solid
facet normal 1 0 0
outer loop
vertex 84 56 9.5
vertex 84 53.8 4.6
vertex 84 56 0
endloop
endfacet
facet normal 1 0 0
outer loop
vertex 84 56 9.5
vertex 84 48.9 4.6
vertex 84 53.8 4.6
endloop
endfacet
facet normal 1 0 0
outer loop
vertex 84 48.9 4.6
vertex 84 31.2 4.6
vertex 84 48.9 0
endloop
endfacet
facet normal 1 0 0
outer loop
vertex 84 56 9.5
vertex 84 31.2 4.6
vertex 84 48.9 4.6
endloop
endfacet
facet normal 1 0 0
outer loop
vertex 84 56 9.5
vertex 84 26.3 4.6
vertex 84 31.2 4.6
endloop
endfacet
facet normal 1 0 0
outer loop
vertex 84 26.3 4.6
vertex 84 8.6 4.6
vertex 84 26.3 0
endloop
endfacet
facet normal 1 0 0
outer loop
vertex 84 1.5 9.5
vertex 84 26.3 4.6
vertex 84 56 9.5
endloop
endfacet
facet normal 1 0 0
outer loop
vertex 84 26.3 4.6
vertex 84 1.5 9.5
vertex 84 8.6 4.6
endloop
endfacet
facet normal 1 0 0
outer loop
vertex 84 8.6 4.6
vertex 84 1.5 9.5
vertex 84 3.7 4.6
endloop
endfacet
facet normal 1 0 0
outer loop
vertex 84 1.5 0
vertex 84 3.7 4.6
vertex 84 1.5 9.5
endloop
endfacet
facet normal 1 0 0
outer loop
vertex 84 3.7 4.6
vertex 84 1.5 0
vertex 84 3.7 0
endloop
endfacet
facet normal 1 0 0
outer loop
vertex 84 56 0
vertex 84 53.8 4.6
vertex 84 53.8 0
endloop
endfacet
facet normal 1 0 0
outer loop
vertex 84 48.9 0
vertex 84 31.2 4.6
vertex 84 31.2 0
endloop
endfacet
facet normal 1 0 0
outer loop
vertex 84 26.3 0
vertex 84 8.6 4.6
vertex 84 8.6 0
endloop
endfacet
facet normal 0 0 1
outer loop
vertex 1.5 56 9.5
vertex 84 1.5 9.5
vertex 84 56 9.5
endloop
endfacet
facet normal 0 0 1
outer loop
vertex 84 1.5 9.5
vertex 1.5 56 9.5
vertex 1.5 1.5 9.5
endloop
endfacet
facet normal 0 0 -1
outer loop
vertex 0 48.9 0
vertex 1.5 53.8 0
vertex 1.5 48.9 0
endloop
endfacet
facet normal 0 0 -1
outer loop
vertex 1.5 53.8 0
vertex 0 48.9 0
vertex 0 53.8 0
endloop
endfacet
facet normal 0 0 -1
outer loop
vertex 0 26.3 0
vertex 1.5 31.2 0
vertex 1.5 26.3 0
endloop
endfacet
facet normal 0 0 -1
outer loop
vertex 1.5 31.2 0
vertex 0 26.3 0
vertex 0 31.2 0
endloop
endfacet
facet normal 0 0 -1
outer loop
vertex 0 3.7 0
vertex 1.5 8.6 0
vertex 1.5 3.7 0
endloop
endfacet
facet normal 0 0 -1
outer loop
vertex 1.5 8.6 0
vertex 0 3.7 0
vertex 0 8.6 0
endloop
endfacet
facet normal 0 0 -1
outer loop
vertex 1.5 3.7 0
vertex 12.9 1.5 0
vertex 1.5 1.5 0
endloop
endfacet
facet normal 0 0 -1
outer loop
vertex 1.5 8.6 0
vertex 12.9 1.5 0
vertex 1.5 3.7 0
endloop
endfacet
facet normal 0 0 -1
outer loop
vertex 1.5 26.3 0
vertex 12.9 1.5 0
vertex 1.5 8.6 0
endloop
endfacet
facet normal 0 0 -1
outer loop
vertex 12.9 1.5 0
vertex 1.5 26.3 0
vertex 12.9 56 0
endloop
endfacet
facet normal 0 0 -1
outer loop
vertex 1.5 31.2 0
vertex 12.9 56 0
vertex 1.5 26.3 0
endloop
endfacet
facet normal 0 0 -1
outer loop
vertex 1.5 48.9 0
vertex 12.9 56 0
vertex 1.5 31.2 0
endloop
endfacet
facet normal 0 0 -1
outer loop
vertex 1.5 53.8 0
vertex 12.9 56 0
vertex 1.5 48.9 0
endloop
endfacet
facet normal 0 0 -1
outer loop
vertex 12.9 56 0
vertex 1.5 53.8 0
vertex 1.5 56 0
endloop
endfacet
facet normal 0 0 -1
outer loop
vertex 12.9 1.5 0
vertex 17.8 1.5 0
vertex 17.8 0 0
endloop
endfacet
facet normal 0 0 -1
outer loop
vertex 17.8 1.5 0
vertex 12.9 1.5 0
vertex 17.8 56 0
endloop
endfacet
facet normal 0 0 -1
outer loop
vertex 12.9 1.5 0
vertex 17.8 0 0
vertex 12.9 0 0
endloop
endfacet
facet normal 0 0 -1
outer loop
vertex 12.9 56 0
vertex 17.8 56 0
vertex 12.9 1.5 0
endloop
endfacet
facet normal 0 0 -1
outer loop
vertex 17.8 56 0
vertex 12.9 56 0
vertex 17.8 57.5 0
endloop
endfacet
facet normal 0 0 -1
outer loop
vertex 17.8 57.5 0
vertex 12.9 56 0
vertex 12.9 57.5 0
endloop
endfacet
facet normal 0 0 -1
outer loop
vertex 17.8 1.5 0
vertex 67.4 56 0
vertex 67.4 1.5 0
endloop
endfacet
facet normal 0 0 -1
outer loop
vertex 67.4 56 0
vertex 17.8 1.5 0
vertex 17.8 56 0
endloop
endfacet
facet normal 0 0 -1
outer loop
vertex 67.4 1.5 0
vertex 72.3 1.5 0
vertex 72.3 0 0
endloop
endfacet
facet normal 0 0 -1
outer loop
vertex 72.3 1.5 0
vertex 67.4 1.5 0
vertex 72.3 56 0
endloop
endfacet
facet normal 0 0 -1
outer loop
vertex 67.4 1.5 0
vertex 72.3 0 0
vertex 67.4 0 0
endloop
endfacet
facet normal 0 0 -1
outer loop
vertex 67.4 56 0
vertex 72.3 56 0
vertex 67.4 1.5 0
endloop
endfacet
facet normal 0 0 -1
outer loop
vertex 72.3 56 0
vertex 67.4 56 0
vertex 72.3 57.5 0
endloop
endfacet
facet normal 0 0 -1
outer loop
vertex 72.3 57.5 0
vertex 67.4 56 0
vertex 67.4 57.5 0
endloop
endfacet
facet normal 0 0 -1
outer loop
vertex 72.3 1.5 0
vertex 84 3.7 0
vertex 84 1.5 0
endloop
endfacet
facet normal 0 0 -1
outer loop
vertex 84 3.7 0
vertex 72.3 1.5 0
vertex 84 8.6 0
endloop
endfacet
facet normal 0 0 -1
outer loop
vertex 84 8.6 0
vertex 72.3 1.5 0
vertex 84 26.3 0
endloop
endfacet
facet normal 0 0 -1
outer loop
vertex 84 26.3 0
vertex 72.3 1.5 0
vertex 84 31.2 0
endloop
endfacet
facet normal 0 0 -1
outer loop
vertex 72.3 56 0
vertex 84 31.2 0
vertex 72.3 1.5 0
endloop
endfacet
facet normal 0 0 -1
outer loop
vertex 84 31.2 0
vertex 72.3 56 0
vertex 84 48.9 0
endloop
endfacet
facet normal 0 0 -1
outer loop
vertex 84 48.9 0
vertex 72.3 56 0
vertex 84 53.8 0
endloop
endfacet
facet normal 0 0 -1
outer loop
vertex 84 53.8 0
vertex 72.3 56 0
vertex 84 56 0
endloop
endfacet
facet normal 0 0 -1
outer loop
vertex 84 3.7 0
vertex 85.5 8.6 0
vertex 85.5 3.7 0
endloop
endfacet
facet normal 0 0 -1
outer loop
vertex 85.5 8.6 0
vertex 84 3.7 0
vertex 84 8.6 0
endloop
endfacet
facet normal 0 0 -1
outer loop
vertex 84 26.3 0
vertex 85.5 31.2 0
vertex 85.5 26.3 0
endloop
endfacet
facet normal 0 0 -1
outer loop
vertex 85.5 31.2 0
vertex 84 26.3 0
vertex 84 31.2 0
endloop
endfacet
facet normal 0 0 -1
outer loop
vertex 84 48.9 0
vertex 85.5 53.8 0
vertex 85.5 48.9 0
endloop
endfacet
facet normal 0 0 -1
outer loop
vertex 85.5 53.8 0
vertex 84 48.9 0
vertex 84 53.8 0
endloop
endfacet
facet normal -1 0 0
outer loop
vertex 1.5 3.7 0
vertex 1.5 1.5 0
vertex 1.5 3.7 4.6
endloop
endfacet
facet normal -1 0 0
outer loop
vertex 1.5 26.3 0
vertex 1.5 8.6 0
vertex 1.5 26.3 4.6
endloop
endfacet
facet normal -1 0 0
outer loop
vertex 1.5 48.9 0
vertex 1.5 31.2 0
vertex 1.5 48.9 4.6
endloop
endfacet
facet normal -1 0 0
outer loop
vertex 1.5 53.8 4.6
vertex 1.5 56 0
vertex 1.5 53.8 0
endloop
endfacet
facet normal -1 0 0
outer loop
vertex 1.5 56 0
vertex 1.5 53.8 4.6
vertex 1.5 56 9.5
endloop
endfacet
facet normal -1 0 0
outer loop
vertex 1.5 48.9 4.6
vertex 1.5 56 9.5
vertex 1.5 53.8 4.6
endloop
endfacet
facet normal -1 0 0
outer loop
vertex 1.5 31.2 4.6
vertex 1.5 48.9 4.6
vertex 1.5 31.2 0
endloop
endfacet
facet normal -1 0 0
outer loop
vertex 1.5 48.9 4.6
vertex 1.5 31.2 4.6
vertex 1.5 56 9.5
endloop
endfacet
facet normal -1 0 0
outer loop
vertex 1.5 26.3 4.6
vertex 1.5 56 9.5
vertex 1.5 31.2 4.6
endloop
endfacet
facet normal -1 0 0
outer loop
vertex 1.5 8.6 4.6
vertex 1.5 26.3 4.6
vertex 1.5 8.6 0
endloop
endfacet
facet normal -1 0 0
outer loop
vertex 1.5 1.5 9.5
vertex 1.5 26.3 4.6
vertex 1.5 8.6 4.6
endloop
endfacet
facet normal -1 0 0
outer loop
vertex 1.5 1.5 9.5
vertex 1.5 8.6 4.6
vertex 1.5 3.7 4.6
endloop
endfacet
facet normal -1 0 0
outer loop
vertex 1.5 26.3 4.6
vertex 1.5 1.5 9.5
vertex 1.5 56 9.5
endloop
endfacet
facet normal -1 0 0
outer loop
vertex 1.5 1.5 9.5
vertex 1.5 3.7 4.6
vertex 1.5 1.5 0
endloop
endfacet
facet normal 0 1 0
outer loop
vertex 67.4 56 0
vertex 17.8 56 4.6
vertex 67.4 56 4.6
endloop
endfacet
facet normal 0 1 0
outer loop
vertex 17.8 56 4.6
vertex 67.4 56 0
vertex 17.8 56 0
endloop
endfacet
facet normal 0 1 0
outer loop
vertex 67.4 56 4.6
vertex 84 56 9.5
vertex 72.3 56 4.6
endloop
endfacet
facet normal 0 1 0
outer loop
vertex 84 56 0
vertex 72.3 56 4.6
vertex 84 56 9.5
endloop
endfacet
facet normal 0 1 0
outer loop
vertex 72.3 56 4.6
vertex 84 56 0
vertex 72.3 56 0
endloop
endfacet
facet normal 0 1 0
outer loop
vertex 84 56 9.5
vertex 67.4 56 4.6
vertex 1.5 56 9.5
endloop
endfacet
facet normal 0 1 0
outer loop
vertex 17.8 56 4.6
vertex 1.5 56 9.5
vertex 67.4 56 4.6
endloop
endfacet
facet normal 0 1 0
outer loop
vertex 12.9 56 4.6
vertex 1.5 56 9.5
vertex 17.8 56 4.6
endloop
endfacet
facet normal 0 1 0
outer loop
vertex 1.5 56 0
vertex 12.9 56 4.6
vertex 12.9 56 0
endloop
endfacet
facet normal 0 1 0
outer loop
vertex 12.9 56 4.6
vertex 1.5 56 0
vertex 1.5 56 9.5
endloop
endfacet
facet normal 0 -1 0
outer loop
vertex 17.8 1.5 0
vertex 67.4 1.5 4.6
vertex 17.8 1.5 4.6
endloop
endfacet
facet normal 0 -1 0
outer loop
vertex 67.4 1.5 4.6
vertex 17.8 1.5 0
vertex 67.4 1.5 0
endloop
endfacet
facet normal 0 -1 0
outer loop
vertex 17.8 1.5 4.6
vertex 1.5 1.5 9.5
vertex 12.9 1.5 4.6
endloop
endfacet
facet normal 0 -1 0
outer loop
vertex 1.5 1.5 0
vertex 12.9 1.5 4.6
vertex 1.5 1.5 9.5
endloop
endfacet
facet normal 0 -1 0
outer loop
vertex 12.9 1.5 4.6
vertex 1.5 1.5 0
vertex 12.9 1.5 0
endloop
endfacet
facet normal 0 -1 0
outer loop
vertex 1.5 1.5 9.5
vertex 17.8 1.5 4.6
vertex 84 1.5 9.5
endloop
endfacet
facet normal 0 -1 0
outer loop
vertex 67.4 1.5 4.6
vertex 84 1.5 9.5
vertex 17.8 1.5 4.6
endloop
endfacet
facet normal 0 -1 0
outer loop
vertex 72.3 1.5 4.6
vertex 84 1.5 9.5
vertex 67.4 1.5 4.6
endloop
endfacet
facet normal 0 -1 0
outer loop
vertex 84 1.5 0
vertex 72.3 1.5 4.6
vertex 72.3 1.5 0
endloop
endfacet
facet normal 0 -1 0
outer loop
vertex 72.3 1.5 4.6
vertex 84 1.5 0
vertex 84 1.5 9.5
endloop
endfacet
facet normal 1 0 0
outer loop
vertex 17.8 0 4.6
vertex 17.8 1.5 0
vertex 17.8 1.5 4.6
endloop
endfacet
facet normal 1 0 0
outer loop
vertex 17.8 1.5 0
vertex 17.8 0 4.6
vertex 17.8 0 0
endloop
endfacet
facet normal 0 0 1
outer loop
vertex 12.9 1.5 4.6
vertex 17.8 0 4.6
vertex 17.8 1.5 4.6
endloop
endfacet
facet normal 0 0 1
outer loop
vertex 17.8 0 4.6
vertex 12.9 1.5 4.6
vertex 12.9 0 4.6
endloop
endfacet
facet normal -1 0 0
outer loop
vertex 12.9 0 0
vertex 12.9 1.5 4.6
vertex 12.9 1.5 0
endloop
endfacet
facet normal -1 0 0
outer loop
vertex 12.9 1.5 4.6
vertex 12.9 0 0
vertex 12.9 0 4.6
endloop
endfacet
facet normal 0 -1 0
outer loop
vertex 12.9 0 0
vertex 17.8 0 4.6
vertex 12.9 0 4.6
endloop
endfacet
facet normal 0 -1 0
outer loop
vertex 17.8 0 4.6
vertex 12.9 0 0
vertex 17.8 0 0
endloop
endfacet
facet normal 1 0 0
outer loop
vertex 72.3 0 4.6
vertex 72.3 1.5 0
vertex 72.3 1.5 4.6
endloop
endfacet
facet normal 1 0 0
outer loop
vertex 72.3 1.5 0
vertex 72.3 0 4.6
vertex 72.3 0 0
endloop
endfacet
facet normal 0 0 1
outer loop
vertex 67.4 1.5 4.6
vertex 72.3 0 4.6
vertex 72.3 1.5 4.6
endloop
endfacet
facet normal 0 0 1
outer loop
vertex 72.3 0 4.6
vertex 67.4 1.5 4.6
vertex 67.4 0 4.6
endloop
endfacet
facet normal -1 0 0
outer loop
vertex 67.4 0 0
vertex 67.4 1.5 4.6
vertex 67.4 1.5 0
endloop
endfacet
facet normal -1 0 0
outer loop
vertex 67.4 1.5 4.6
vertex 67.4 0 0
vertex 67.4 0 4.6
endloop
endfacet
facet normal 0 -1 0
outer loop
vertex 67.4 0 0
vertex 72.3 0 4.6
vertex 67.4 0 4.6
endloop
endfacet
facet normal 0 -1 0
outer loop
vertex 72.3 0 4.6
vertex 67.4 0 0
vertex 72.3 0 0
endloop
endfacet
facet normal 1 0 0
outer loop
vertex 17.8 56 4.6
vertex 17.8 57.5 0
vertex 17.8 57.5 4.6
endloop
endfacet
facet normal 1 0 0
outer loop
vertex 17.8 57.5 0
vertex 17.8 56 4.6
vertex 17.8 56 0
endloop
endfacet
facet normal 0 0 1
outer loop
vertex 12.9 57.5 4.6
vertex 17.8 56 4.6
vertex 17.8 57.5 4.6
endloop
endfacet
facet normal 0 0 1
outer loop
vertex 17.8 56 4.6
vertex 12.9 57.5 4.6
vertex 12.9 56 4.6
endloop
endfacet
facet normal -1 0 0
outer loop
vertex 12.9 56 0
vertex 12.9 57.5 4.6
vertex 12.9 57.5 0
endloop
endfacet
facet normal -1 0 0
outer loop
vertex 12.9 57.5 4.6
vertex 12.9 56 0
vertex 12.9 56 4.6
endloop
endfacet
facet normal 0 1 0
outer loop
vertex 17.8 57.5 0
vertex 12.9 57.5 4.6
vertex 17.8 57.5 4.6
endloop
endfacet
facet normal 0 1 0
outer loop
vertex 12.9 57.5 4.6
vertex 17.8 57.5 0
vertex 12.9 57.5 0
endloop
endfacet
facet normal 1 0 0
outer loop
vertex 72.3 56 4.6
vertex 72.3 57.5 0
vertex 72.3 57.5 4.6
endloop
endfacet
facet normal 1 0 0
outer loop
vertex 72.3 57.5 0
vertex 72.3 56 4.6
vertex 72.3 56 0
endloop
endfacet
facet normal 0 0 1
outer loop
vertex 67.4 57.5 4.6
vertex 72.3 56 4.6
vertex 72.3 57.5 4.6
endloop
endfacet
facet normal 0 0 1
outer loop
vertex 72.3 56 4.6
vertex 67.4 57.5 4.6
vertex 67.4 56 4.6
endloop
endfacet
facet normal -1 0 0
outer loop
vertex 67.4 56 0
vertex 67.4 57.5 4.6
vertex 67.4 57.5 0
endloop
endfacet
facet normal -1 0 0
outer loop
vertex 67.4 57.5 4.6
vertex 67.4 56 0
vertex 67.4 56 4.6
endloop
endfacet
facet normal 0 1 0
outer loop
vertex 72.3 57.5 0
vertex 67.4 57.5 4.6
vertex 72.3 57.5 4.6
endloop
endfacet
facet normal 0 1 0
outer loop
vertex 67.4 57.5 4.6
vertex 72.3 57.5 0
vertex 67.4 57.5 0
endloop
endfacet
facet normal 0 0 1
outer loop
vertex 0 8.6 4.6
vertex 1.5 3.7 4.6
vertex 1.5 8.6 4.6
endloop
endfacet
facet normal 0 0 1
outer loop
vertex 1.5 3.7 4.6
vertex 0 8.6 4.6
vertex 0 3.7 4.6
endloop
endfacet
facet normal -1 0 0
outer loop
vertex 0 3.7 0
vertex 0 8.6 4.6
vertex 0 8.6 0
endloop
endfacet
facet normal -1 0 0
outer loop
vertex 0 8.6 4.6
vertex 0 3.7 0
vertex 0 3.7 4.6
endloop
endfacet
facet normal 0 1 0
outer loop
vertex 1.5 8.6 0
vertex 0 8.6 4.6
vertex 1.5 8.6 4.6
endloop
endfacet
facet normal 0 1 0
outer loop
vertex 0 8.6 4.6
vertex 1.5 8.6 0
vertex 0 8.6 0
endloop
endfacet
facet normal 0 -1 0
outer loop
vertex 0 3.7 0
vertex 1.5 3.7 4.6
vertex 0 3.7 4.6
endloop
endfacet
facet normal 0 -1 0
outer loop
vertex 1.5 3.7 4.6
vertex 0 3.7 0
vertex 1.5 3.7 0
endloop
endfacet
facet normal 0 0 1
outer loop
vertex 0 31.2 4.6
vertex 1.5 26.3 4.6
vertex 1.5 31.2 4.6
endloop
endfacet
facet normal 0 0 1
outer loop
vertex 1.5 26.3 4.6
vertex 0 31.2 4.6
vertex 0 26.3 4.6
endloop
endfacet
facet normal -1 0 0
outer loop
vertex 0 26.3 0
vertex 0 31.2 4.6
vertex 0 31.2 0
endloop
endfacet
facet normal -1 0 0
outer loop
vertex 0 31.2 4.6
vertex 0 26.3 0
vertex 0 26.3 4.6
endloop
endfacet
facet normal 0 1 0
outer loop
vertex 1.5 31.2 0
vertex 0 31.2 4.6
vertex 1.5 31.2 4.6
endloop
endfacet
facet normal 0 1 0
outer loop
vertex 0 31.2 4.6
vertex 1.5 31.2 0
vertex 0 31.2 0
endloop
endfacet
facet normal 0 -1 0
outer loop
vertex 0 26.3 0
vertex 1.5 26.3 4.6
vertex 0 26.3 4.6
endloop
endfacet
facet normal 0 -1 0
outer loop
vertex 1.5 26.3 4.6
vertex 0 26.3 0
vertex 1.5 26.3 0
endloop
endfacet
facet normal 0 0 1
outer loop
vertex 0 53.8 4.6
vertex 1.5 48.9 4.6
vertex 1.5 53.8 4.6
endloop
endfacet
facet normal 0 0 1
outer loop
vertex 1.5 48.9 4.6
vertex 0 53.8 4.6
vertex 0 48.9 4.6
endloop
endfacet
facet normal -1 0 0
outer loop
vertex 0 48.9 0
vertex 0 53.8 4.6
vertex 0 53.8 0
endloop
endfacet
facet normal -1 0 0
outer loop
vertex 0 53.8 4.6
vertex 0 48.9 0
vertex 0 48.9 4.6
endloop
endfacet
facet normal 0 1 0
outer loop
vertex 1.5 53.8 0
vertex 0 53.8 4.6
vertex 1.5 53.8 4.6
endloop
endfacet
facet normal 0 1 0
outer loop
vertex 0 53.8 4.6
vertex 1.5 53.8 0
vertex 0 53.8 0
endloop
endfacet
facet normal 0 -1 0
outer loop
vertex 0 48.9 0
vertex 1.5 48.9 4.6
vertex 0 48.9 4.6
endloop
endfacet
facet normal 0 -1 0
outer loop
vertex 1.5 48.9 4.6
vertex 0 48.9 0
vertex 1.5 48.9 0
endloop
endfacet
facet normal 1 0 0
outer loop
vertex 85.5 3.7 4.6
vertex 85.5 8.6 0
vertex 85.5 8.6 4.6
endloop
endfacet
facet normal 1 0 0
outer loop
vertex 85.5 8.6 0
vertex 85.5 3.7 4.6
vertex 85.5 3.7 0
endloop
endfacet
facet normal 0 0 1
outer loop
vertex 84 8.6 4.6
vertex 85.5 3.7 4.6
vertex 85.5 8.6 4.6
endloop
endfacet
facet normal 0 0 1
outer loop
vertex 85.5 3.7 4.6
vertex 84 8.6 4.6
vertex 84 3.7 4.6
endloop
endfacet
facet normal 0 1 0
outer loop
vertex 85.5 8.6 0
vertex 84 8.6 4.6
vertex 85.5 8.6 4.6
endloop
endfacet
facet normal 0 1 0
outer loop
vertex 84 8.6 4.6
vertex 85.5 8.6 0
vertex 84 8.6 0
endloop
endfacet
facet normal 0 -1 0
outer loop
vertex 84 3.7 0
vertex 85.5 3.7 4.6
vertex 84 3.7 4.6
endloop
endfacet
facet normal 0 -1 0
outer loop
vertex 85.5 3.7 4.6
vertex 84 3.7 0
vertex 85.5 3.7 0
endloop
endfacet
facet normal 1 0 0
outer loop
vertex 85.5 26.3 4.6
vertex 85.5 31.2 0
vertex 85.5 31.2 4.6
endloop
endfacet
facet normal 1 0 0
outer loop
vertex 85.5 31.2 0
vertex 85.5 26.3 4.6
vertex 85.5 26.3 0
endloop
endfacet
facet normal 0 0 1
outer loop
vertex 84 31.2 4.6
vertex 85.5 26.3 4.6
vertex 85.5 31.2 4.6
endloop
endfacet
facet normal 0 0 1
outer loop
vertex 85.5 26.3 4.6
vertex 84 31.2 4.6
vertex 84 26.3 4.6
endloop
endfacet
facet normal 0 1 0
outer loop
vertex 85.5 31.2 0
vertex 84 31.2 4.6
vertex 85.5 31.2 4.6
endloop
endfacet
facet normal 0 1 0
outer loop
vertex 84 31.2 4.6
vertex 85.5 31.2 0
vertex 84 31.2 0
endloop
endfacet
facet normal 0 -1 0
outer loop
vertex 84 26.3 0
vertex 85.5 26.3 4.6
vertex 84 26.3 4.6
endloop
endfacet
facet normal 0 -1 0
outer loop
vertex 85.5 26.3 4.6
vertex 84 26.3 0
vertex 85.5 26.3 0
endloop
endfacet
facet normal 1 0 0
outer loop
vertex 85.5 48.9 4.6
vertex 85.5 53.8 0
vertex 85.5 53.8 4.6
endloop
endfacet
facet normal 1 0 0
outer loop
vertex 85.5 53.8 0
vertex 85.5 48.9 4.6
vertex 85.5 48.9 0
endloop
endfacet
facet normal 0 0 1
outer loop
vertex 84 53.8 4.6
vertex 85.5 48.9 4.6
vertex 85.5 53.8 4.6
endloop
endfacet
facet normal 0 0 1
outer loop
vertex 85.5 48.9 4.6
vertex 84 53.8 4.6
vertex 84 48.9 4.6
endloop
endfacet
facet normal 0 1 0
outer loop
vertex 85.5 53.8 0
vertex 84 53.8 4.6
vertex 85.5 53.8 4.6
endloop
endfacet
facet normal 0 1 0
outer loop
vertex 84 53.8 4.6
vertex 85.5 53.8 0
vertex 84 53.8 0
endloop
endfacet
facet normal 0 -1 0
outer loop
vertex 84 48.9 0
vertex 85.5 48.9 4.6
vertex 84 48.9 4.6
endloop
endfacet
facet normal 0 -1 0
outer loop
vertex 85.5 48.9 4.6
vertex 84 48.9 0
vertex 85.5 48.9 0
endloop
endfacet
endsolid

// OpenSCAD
/*
 * Breadboad
 * from: https://github.com/rlerdorf/BBBox
 */

/* [Box dimensions] */
Thick        = 2; // Wall thickness. If you change this you will have to adjust a few things

/* [Box options] */
m           = 0.9; // Tolerance (Panels/rails gap)

/* BreadBoard Mount */
BBMount   =  1;

BBLength  = 82.5;
BBHeight  =  9.5;
BBWidth   = 54.5;
TabWidth  =  4.9; // These tabs tend to vary from one brand to another. Measure carefully!
TabDepth  =  1.5;
TabHeight =  4.6;

XNearTabEdgeDist = 11.4;
XFarTabEdgeDist = 11.7;
YNearTabEdgeDist = 2.2;
YFarTabEdgeDist = 2.2;

// NOTE: it would be better to use the real tab width + a tolerance, rather than making the tab with wider so that the board fits in the tray

BBPosX    = TabDepth; // originally 2
BBPosY    = TabDepth; // originally 2

module BBTabs() {
        union() {
            cube([BBLength, BBWidth, BBHeight]);
            // x-axis (near): near tab
            translate([XNearTabEdgeDist, -TabDepth, 0]) {
                cube([TabWidth, TabDepth*2, TabHeight]);
            }
            // x-axis (near): far tab
            translate([BBLength-TabWidth-XFarTabEdgeDist, -TabDepth, 0]) {
                cube([TabWidth, TabDepth*2, TabHeight]);
            }
            // x-axis (far): near tab
            translate([XNearTabEdgeDist, BBWidth-TabDepth, 0]) {
                cube([TabWidth, TabDepth*2, TabHeight]);
            }
            // x-axis (far): far tab
            translate([BBLength-TabWidth-XFarTabEdgeDist, BBWidth-TabDepth, 0]) {
                cube([TabWidth, TabDepth*2, TabHeight]);
            }
            // y-axis (near): near tab
            translate([-TabDepth, YNearTabEdgeDist, 0]) {
                cube([TabDepth*2, TabWidth, TabHeight]);
            }
            // y-axis (near): middle tab
            translate([-TabDepth, BBWidth/2-TabWidth/2, 0]) {
                cube([TabDepth*2, TabWidth, TabHeight]);
            }
            // y-axis (near): far tab
            translate([-TabDepth, BBWidth-TabWidth-YFarTabEdgeDist, 0]) {
                cube([TabDepth*2, TabWidth, TabHeight]);
            }
            // y-axis (far): near tab
            translate([BBLength-TabDepth, YNearTabEdgeDist, 0]) {
                cube([TabDepth*2, TabWidth, TabHeight]);
            }
            // y-axis (far): middle tab
            translate([BBLength-TabDepth, BBWidth/2-TabWidth/2, 0]) {
                cube([TabDepth*2, TabWidth, TabHeight]);
            }
            // y-axis (far): far tab
            translate([BBLength-TabDepth, BBWidth-TabWidth-YFarTabEdgeDist, 0]) {
                cube([TabDepth*2, TabWidth, TabHeight]);
            }
        }
}

module BB() {
    translate([BBPosX, BBPosY, 0]) {
        BBTabs();
    }
}

if(BBMount==1) {
    translate([BBPosX, BBPosY, 0]) {
        BBTabs();
    }
}
